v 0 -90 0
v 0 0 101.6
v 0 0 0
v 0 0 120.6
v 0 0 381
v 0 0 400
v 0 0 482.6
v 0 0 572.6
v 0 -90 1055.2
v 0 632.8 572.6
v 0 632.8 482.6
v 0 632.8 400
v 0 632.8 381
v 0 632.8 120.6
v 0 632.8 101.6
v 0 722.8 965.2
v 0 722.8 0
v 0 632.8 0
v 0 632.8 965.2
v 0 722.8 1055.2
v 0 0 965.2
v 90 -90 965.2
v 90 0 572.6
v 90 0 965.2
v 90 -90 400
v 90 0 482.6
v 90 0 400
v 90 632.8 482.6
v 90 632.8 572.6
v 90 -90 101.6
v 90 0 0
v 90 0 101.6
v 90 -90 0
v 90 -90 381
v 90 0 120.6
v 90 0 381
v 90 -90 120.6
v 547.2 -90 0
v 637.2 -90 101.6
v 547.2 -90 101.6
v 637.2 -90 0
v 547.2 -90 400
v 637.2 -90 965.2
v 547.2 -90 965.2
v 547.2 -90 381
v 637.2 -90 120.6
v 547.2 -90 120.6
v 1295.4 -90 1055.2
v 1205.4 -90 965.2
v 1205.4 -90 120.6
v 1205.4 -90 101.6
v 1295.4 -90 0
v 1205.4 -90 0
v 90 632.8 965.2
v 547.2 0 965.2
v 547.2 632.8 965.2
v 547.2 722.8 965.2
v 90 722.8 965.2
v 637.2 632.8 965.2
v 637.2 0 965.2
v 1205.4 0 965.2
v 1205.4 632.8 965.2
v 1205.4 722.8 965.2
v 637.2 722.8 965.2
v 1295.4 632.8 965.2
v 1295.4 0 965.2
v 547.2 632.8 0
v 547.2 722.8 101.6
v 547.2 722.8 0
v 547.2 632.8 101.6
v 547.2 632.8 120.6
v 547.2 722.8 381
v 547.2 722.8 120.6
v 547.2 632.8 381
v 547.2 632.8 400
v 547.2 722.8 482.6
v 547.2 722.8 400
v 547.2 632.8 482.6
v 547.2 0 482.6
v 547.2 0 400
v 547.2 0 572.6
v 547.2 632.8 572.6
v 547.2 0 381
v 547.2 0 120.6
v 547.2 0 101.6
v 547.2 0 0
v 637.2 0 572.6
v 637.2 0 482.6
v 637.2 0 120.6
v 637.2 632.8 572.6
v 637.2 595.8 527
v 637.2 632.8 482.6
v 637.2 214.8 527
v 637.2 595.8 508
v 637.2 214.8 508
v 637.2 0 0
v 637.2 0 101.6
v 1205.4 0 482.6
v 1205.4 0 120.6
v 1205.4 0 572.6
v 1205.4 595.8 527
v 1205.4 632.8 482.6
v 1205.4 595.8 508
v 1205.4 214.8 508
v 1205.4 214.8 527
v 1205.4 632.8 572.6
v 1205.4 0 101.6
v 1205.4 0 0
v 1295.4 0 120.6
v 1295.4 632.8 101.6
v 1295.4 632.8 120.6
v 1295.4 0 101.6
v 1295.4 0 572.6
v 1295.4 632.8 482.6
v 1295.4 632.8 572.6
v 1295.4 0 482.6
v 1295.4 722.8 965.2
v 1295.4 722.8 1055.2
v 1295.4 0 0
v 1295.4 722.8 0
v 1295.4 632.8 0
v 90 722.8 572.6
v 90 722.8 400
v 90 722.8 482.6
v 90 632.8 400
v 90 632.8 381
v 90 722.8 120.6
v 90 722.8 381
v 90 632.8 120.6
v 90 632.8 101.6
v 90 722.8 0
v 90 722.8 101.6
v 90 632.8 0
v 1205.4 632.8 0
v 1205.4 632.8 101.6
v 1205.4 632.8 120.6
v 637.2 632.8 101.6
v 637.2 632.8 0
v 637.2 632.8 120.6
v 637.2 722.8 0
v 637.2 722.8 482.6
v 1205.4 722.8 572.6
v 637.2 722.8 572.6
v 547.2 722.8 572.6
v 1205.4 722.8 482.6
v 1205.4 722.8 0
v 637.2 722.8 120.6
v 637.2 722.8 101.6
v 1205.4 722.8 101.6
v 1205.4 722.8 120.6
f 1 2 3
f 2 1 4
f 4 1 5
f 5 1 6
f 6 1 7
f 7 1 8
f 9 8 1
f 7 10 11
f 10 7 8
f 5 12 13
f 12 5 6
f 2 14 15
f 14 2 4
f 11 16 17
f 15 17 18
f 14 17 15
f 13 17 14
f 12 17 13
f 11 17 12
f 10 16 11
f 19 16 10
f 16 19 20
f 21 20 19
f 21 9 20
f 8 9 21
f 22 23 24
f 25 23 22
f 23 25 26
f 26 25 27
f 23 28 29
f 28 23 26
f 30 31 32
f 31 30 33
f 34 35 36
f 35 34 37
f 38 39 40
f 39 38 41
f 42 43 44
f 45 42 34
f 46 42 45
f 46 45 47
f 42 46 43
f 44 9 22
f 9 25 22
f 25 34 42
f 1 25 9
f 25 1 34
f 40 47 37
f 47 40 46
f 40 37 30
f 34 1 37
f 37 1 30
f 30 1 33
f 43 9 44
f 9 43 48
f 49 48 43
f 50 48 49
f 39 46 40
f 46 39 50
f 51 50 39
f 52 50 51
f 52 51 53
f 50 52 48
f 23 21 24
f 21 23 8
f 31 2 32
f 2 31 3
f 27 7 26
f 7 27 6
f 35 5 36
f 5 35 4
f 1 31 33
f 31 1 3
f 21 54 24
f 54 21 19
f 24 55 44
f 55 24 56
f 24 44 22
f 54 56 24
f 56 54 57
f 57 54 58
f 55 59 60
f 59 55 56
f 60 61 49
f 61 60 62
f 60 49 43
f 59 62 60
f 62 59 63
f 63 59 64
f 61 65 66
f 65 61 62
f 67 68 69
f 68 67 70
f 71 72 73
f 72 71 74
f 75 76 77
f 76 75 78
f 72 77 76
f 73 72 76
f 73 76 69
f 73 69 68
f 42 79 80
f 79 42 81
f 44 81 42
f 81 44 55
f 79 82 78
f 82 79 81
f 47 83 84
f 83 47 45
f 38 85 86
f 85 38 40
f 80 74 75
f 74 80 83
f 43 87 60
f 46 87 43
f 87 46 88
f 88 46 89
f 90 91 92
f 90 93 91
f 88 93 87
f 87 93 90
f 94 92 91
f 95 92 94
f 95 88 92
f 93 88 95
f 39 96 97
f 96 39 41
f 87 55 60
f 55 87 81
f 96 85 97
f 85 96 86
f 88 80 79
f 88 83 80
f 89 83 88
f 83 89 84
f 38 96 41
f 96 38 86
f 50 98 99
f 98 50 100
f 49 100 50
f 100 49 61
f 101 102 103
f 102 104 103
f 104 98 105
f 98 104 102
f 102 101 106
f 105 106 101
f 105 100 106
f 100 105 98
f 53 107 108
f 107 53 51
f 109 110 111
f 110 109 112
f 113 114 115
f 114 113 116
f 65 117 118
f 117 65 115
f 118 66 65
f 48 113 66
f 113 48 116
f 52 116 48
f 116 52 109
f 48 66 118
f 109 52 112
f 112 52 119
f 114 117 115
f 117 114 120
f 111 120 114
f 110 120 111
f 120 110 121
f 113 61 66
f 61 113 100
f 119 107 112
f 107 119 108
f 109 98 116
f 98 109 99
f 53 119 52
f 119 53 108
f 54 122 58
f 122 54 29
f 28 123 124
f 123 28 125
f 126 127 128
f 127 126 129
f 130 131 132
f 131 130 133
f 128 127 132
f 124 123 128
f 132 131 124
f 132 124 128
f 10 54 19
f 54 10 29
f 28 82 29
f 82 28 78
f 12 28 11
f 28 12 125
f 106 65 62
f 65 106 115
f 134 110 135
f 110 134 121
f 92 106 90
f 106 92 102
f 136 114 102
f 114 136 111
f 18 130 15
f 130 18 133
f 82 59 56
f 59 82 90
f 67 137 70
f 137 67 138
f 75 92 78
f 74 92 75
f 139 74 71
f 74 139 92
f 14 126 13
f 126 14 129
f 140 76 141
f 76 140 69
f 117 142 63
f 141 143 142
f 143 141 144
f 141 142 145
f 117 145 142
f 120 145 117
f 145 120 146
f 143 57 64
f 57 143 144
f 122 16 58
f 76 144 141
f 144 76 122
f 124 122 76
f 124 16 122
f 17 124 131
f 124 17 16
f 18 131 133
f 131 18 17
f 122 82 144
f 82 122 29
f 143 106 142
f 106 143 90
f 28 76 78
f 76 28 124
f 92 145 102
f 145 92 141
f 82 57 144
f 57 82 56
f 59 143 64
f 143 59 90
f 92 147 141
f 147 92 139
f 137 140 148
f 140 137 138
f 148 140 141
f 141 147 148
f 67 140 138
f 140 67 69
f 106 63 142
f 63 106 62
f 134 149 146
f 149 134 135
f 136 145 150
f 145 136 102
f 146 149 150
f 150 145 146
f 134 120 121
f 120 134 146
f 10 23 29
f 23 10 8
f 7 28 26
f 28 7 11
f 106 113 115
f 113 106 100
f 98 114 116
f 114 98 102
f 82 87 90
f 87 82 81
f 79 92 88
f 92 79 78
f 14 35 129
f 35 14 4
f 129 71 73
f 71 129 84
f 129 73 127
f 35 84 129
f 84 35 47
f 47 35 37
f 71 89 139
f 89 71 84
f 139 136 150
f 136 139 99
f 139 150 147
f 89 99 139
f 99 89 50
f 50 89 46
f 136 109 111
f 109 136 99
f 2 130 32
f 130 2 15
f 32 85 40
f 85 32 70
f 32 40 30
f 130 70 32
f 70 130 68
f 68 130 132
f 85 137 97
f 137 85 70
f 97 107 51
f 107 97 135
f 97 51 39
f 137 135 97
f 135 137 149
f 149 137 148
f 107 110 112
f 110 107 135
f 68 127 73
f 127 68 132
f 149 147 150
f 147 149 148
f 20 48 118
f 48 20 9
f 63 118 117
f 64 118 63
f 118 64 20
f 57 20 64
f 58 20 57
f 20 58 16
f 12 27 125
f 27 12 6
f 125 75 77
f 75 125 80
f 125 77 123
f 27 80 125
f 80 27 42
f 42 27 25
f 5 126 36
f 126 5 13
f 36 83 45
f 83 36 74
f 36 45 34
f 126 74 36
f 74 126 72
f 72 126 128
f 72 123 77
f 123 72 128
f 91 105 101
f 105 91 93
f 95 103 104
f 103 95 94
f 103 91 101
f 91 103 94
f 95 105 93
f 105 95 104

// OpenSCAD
// units are in mm
inch = 25.4;
// base parameters
oneby = 19;
twoby = 21;
fourby = 90;
// table parameters
length = 51 * inch;
height = 38 * inch;
width = 32 * inch; // 32 min
// inner dimensions
middle = 18 * inch + fourby;
// bottom shelf settings
btm_height = 4 * inch;



module onebytwo(length) {
    cube([oneby, length, twoby]);
}
module twobyfour(length) {
    cube([twoby, length, fourby]);
}
module twobytwo(length) {
    cube([twoby, length, twoby]);
}
module fourbyfour(length) {
    cube([fourby, length, fourby]);
}
module tabletop(length, width) {
    cube([length, width, fourby]);
}
module crossbar(length) {
    cube([length, fourby, fourby]);
}

module leg() {
    rotate([90, 0, 0])
    fourbyfour(height);
}

module back_legs() {
    leg();
    translate([fourby, -fourby, height / 2])
    crossbar(middle);
    translate([middle, 0, 0])
    leg();
    translate([middle, -fourby, height / 2])
    crossbar(length - middle);
    translate([length - fourby, 0, 0])
    leg();
}

module front_legs() {
    leg();
    translate([middle, 0, 0])
    leg();
    translate([length - fourby, 0, 0])
    leg();
}

module legs() {
    front_legs();
    translate([0, width - fourby, 0])
    back_legs();
    translate([fourby, -fourby, height / 2])
    rotate([0, 0, 90])
    crossbar(width);
    translate([length, -fourby, height / 2])
    rotate([0, 0, 90])
    crossbar(width);
    translate([middle + fourby, -fourby, height / 2])
    rotate([0, 0, 90])
    crossbar(width);
}

module bottom_shelf() {
    translate([0, -fourby, btm_height])
    cube([length, width, oneby]);
}

module printer_shelf() {
    cube([middle, width, oneby]);
}

module cricut_shelf() {
    cube([length - middle, 15 * inch, oneby]);
    //rotate([90, 0, 0])
    //translate([0, -height + 18 * inch, -oneby])
    //twobytwo(height - 18 * inch);
    //rotate([90, 0, 0])
    //translate([length - middle - oneby, -height + 18 * inch, -oneby])
    //twobytwo(height - 18 * inch);
}
    
module table() {
    legs();
    bottom_shelf();
    translate([0, -fourby, height])
    tabletop(length, width);
    translate([0, -fourby, 15 * inch])
    printer_shelf();
    translate([middle, width - 20 * inch - fourby, height - 18 * inch])
    cricut_shelf();
}

// onebytwo(200);
// twobyfour(300);
// translate([0, height, 0])
// tabletop(300, 200);
// legs();
table();
